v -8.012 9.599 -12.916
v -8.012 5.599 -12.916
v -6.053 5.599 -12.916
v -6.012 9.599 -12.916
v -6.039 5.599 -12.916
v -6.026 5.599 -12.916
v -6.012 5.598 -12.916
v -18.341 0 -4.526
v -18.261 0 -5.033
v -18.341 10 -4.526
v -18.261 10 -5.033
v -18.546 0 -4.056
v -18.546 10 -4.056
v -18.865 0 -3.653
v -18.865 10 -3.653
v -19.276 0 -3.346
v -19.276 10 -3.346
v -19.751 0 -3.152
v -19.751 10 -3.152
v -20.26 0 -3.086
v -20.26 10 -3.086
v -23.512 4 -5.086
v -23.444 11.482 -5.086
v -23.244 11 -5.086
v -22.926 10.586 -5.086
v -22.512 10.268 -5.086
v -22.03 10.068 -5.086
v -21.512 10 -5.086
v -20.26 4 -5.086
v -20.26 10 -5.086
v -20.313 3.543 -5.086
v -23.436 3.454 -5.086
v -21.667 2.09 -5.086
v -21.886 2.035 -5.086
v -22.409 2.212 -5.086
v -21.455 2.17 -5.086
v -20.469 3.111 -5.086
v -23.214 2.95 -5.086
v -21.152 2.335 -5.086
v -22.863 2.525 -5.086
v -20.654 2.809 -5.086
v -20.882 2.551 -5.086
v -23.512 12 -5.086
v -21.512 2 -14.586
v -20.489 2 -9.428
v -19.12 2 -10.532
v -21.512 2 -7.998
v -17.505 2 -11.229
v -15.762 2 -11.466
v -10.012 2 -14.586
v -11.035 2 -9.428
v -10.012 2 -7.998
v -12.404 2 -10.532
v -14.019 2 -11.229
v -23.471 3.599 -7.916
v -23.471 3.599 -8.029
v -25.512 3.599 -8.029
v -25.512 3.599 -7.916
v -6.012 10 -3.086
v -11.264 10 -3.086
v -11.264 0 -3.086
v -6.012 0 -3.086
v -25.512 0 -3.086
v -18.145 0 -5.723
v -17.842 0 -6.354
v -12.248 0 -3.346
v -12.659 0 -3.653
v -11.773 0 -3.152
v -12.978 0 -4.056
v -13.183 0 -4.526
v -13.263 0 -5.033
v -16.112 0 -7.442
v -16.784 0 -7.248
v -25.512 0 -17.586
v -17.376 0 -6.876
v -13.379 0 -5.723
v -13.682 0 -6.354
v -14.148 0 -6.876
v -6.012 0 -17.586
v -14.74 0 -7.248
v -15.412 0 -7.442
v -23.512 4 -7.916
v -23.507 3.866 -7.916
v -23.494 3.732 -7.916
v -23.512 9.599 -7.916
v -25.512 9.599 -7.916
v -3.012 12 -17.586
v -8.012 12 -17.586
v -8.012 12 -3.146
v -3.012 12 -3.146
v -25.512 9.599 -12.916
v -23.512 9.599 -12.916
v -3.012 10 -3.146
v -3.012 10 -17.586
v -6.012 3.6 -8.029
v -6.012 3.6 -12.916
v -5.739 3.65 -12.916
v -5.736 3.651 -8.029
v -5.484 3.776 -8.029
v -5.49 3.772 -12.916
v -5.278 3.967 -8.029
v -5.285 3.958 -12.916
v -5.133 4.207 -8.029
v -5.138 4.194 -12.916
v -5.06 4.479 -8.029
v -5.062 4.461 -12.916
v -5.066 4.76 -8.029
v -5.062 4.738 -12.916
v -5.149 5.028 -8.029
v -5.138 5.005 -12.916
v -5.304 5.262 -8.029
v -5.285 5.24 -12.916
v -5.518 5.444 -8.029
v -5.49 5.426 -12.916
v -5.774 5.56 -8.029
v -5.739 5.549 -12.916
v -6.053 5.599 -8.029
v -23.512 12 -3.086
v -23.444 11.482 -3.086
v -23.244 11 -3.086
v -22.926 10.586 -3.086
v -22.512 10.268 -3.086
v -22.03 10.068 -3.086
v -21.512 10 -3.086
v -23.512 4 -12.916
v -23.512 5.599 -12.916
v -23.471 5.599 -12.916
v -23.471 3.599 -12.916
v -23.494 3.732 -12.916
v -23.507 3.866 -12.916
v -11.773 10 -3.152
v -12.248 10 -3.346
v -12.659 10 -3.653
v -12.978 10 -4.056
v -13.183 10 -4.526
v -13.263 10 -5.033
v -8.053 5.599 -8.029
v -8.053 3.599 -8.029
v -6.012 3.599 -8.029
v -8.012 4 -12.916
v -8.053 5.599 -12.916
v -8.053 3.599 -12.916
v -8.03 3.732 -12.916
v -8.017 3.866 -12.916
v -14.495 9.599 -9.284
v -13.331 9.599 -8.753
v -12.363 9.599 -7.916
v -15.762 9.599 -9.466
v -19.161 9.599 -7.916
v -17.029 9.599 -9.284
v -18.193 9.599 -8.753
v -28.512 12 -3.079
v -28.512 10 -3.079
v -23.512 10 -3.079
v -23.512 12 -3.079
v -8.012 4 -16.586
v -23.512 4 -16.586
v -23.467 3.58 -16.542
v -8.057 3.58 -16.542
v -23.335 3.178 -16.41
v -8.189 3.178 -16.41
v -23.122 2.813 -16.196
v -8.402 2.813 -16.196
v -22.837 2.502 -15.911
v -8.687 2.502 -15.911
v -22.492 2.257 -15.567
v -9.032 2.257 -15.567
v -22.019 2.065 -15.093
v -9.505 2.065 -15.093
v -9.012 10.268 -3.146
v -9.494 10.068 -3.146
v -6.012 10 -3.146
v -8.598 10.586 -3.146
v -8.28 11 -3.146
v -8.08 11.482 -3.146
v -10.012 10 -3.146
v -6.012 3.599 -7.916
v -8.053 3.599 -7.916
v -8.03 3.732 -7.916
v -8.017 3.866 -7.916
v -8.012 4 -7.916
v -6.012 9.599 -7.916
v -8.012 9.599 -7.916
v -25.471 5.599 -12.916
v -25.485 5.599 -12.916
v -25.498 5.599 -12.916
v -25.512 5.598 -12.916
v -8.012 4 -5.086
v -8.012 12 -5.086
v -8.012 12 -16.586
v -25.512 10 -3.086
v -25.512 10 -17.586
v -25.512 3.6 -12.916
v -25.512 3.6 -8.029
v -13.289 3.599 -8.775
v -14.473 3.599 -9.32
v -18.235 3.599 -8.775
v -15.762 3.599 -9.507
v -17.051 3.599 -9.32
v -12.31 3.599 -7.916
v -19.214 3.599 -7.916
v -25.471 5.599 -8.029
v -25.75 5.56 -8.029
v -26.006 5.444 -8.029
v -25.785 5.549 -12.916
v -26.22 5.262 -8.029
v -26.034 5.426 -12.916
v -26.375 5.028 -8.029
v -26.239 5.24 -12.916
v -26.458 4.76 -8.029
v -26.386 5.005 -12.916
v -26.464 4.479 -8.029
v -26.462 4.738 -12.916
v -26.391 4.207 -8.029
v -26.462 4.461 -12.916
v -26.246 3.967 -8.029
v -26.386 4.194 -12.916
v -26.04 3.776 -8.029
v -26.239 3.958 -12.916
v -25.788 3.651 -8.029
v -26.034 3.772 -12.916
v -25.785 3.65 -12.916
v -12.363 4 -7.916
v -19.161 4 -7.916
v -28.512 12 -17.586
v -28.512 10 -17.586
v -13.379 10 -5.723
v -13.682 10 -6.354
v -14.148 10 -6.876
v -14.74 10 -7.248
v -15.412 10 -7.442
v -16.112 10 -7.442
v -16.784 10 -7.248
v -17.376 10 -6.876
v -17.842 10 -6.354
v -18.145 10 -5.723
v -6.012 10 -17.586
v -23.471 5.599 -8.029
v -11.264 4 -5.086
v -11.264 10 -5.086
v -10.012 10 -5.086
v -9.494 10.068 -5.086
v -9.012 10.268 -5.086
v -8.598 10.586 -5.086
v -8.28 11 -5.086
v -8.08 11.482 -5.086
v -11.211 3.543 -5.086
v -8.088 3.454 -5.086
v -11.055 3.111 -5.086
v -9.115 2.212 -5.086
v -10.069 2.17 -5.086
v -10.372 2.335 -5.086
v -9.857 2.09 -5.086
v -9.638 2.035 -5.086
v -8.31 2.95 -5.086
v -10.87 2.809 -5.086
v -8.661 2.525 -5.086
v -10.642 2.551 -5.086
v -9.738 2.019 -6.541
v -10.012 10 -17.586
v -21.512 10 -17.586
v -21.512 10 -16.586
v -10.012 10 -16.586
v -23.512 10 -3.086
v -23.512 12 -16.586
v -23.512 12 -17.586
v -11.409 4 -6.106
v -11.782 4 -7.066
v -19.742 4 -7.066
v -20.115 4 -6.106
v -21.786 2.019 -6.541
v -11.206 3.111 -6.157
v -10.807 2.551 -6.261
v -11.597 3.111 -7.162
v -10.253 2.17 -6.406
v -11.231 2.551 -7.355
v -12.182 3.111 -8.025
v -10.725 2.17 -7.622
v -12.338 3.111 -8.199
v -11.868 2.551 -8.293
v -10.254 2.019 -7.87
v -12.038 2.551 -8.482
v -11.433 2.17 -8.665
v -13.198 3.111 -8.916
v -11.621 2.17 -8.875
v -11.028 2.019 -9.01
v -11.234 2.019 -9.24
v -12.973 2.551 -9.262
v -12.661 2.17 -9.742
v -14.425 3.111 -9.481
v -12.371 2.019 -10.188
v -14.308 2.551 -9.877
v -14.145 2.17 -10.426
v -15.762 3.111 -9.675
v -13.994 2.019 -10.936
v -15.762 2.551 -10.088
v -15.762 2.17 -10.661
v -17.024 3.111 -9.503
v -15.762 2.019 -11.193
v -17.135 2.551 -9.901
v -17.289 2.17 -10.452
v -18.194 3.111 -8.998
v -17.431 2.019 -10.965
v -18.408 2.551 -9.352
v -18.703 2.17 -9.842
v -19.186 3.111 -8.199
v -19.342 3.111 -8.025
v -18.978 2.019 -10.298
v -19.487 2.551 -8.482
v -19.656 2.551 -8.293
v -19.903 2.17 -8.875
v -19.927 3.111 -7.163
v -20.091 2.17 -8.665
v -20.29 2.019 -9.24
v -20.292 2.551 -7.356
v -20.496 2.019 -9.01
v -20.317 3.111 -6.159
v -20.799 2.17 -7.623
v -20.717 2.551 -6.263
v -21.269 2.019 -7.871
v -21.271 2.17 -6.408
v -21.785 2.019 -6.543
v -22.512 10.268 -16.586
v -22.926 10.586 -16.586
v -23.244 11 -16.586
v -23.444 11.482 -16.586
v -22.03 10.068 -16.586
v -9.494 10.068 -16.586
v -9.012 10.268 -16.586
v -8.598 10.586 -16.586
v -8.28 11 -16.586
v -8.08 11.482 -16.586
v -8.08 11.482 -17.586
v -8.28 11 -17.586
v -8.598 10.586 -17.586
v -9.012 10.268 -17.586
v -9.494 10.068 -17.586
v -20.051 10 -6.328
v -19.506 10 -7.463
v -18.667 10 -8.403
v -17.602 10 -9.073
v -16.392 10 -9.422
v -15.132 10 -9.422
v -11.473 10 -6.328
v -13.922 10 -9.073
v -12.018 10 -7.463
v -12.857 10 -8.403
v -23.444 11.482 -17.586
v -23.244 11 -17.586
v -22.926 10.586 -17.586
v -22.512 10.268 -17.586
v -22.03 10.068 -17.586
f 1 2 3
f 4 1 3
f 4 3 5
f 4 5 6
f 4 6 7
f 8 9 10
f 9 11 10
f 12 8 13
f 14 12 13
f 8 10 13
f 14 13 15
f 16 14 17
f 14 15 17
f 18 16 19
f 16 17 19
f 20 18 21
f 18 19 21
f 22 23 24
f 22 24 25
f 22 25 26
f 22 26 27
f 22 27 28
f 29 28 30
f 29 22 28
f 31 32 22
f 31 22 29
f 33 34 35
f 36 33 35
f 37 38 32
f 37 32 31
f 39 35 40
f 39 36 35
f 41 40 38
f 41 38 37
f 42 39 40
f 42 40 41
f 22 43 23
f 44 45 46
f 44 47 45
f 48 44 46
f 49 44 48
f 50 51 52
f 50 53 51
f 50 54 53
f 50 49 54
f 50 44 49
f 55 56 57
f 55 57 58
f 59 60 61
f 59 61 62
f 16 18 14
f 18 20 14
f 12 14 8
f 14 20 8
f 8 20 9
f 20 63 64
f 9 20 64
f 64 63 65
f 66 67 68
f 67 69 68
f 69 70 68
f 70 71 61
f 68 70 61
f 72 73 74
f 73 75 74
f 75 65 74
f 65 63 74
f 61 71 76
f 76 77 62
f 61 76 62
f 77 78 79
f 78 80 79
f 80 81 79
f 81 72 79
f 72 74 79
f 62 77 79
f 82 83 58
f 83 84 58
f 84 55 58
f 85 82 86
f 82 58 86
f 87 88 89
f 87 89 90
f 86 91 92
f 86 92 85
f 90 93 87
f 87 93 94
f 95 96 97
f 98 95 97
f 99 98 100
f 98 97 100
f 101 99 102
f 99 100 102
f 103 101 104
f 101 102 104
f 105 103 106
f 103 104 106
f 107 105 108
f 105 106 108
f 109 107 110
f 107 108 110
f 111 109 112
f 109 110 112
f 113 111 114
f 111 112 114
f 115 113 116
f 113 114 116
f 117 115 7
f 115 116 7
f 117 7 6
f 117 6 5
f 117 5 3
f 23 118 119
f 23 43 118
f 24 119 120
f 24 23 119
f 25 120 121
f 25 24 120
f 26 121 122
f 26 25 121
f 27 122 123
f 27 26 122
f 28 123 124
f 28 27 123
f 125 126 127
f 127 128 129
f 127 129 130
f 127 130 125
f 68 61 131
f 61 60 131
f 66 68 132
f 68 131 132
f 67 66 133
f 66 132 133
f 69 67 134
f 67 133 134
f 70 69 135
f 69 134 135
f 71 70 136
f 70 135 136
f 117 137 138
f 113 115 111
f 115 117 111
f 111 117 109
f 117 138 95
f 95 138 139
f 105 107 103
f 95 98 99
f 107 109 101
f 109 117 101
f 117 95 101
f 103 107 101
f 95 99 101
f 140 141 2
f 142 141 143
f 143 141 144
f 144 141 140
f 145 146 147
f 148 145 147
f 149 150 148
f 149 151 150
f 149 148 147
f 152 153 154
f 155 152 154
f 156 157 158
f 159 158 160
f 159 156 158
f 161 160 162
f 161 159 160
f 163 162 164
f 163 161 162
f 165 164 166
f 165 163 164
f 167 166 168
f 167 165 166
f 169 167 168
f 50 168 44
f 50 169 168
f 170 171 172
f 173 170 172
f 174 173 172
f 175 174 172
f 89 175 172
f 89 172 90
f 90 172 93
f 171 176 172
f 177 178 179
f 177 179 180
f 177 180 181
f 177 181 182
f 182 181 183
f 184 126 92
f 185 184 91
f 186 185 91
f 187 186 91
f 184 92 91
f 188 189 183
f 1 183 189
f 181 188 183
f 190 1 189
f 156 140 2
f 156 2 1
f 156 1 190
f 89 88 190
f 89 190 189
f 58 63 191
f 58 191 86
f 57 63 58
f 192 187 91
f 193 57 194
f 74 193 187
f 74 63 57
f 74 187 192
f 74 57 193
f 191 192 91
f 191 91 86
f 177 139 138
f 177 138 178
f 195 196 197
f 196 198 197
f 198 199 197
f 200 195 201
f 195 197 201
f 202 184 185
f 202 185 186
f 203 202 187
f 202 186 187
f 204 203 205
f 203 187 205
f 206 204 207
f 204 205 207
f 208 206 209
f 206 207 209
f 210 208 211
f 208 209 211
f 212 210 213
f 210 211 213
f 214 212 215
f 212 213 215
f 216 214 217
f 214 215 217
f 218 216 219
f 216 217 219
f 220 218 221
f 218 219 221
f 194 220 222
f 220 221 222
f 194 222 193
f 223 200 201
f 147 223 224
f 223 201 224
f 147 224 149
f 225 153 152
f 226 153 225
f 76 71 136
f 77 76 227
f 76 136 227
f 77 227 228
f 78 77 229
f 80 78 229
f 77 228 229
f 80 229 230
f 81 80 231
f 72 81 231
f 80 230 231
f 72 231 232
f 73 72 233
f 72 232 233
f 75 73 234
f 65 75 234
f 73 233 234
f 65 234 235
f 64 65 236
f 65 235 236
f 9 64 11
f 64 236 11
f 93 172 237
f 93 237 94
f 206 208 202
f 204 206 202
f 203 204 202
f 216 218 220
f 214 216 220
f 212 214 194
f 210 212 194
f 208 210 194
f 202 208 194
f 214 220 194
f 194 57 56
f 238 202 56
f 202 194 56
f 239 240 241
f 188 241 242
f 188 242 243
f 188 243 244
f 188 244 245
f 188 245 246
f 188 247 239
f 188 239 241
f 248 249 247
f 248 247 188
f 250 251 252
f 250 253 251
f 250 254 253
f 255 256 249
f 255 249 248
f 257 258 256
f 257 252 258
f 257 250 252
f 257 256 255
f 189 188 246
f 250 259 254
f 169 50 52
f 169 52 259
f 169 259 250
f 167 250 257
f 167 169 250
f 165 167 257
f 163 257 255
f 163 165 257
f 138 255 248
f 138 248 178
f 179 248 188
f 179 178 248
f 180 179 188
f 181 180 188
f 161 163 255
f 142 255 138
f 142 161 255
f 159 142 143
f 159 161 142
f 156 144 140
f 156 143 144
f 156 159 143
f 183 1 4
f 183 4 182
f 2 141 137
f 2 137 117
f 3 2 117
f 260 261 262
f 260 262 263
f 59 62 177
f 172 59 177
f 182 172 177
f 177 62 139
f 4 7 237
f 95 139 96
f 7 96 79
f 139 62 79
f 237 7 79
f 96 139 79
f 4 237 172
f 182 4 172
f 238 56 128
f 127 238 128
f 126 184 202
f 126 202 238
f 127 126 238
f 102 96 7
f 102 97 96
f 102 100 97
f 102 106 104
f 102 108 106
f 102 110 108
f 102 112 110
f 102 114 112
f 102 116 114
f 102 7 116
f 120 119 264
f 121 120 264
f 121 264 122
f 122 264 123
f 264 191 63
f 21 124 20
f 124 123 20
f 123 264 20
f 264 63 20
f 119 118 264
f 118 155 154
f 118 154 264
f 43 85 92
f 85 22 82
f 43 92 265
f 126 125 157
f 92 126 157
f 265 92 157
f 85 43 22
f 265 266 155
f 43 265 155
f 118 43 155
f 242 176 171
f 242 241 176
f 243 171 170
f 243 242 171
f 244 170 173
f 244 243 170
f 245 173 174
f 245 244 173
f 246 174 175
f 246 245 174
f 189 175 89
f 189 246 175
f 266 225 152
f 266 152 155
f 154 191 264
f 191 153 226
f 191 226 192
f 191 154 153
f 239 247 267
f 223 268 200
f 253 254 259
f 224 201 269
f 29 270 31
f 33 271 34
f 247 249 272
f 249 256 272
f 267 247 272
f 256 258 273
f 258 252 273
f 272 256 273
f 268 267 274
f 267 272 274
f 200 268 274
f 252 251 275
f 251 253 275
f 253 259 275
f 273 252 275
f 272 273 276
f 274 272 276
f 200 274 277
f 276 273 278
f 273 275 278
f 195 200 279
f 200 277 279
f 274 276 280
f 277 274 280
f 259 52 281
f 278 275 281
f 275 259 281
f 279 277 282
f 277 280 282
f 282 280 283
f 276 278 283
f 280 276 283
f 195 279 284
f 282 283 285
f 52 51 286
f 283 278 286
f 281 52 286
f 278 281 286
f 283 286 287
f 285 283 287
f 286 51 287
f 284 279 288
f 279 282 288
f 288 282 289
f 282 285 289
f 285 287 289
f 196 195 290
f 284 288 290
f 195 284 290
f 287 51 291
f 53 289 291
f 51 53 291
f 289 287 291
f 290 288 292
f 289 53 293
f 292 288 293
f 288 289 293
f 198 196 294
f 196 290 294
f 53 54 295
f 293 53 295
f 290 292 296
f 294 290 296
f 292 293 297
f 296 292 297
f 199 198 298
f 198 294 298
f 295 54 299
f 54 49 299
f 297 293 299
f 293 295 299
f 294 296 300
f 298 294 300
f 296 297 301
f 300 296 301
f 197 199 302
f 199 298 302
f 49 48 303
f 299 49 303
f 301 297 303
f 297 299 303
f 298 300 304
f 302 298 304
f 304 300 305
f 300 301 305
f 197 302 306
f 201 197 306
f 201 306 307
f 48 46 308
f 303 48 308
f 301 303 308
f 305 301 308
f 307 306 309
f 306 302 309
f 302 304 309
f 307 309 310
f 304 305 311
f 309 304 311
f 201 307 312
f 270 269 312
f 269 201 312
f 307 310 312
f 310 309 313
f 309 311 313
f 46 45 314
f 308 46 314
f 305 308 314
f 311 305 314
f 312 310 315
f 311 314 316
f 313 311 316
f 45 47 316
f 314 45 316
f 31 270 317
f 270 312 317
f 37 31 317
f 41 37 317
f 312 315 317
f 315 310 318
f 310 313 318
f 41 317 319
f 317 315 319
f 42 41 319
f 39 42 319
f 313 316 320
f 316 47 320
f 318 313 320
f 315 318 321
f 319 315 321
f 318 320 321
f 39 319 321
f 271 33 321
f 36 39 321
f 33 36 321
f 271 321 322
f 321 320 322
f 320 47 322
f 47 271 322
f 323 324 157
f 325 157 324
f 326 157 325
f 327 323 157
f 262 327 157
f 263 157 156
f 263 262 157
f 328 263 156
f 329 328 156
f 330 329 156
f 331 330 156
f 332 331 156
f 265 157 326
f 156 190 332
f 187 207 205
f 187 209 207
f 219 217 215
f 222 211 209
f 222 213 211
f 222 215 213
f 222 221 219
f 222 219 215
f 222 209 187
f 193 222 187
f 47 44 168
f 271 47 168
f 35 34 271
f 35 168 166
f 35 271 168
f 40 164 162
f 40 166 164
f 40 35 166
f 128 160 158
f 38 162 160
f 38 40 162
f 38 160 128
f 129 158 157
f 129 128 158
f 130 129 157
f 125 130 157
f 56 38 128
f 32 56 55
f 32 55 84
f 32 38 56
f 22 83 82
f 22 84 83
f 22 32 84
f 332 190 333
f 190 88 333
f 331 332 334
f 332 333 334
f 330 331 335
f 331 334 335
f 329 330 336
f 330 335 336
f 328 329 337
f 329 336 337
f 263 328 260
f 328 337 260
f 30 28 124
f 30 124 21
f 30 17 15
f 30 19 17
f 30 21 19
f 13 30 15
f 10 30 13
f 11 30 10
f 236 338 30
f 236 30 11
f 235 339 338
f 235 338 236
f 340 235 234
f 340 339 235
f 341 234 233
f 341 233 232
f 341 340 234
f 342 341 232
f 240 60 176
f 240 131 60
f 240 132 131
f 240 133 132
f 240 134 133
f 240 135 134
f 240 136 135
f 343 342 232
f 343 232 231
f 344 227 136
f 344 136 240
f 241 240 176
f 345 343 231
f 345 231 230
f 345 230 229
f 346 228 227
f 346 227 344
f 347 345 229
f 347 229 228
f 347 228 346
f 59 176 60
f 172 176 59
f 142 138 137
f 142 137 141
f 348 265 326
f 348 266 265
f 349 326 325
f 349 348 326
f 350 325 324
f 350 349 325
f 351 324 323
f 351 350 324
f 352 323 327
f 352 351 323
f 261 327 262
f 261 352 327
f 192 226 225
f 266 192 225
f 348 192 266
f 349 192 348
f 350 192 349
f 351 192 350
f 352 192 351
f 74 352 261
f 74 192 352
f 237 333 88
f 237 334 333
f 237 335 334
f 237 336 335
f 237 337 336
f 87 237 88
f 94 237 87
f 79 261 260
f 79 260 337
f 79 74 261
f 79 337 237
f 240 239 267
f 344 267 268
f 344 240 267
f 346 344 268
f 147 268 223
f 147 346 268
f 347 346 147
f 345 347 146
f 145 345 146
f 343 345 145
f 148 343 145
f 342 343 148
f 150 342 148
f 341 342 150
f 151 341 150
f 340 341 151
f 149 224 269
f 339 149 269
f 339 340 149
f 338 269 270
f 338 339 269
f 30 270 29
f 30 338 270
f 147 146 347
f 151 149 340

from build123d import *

# Parameters (mm, degrees)
SKETCH1_W           = 19.5
SKETCH1_H           = 14.5
BOSS_EXTRUDE1_DEPTH = 10
SKETCH2_R           = 2.5
CUT_EXTRUDE1_DEPTH  = 10
SHELL1_T            = -2
FILLET1_R           = 2
SKETCH3_W           = 15.5
SKETCH3_H           = 1
CUT_EXTRUDE3_DEPTH  = 8
FILLET2_R           = 2
SKETCH4_W           = 5
SKETCH4_H           = 14.507593663
SKETCH4_H_2         = 14.440076449
BOSS_EXTRUDE2_DEPTH = 2
FILLET3_R           = 2
FILLET4_R           = 2
SKETCH5_W           = 5
SKETCH5_H           = 6
CUT_EXTRUDE4_DEPTH  = 22
SKETCH6_W           = 3
SKETCH6_H           = 4.886451311
BOSS_EXTRUDE3_DEPTH = 2
FILLET5_R           = 1


# Some blends are built 0.0001 mm under size
with BuildPart() as part:
    # Sketch1 → Boss-Extrude1 (new body)
    with BuildSketch(Plane(origin=(0, 0, 0), x_dir=(1, 0, 0), z_dir=(0, 1, 0))):
        with Locations((-15.762004242, 10.336365648)):
            Rectangle(SKETCH1_W, SKETCH1_H)
    extrude(amount=BOSS_EXTRUDE1_DEPTH)

    # Sketch2 → Cut-Extrude1 (cut)
    with BuildSketch(Plane(origin=(0, 10, 0), x_dir=(1, 0, 0), z_dir=(0, 1, 0))):
        with Locations((-15.762004242, 4.966482791)):
            Circle(SKETCH2_R)
    extrude(amount=-CUT_EXTRUDE1_DEPTH, mode=Mode.SUBTRACT)

    # Shell1
    shell1_openings = [part.faces().sort_by_distance(p)[0] for p in [
        (-15.762004242, 10, -10.695281365),
    ]]
    offset(amount=SHELL1_T, openings=shell1_openings, kind=Kind.INTERSECTION)

    # Fillet1
    fillet1_edges = [part.edges().sort_by_distance(p)[0] for p in [
        (-17.409778355, 5, -3.086365648),
        (-14.114230128, 5, -3.086365648),
    ]]
    fillet(fillet1_edges, radius=FILLET1_R)

    # Sketch3 → Cut-Extrude3 (cut)
    with BuildSketch(Plane(origin=(0, 10, 0), x_dir=(1, 0, 0), z_dir=(0, 1, 0))):
        with Locations((-15.762004242, 16.086365648)):
            Rectangle(SKETCH3_W, SKETCH3_H)
    extrude(amount=-CUT_EXTRUDE3_DEPTH, mode=Mode.SUBTRACT)

    # Fillet2
    # the kernel refuses this fillet: 2 mm, written as the material it adds along each edge
    with BuildSketch(Plane(origin=(-15.762004242, 2, -4.966482791), x_dir=(0.4658564831234789, 0, 0.8848602924370738), z_dir=(-0.8848602924370738, 0, 0.4658564831234789))) as fillet2_piece_1_section:
        with BuildLine():
            CenterArc((4.5 + FILLET2_R, FILLET2_R), FILLET2_R, 180, 90)
            Line((4.5, FILLET2_R), (4.5, 0))
            Line((4.5, 0), (4.5 + FILLET2_R, 0))
        make_face()
    fillet2_piece_1 = revolve(axis=Axis((-15.762004242, 2, -4.966482791), (0, 1, 0)), revolution_arc=304.468667484, mode=Mode.PRIVATE)
    fillet2_piece_1 = split(fillet2_piece_1, bisect_by=Plane(origin=(-15.762004242, 2.56810824, -5.086365648), z_dir=(0, 0, -1)), keep=Keep.TOP, mode=Mode.PRIVATE)
    add(fillet2_piece_1)
    with BuildSketch(Plane(origin=(-8.012004242, 2, -16.586365648), x_dir=(-1, 0, 0), z_dir=(0, 0, 1)), Plane(origin=(-23.512004242, 2, -5.086365648), x_dir=(1, 0, 0), z_dir=(0, 0, -1))) as fillet2_piece_2:
        with BuildLine():
            CenterArc((FILLET2_R, -FILLET2_R), FILLET2_R, 90, 90)
            Line((0, -FILLET2_R), (0, 0))
            Line((0, 0), (FILLET2_R, 0))
        make_face()
    extrude(amount=11.5)
    with BuildSketch(Plane(origin=(-8.012004242, 2, -16.586365648), x_dir=(0, 1, 0), z_dir=(-1, 0, 0))) as fillet2_piece_3:
        with BuildLine():
            CenterArc((FILLET2_R, -FILLET2_R), FILLET2_R, 90, 90)
            Line((0, -FILLET2_R), (0, 0))
            Line((0, 0), (FILLET2_R, 0))
        make_face()
    extrude(amount=15.5)

    # Sketch4 → Boss-Extrude2 (add)
    with BuildSketch(Plane(origin=(0, 10, 0), x_dir=(1, 0, 0), z_dir=(0, 1, 0))):
        with Locations((-26.012004242, 10.332568817)):
            Rectangle(SKETCH4_W, SKETCH4_H)
        with Locations((-5.512004242, 10.366327424)):
            Rectangle(SKETCH4_W, SKETCH4_H_2)
    extrude(amount=BOSS_EXTRUDE2_DEPTH)

    # Fillet3
    fillet3_edges = [part.edges().sort_by_distance(p)[0] for p in [
        (-8.012004242, 10, -4.116327424),
        (-23.512004242, 10, -4.086365648),
    ]]
    fillet(fillet3_edges, radius=FILLET3_R - 0.0001)  # a hair under: the kernel refuses the full size

    # Fillet4
    fillet4_edges = [part.edges().sort_by_distance(p)[0] for p in [
        (-23.512004242, 10, -17.086365648),
        (-8.012004242, 10, -17.086365648),
    ]]
    fillet(fillet4_edges, radius=FILLET4_R - 0.0001)  # a hair under: the kernel refuses the full size

    # Sketch5 → Cut-Extrude4 (cut)
    with BuildSketch(Plane.ZY.offset(25.512004242)):
        with Locations((-10.415649008, 6.599188408)):
            Rectangle(SKETCH5_W, SKETCH5_H)
    extrude(amount=-CUT_EXTRUDE4_DEPTH, mode=Mode.SUBTRACT)

    # Sketch6 → Boss-Extrude3 (add)
    with BuildSketch(Plane(origin=(0, 3.599188408, 0), x_dir=(1, 0, 0), z_dir=(0, 1, 0))):
        with Locations((-24.971430195, 10.472423353)):
            Rectangle(SKETCH6_W, SKETCH6_H)
        with Locations((-6.552578288, 10.472423353)):
            Rectangle(SKETCH6_W, SKETCH6_H)
    extrude(amount=BOSS_EXTRUDE3_DEPTH)

    # Fillet5
    # the kernel refuses this fillet: 1 mm, written as the material it takes off along each edge
    with BuildSketch(Plane(origin=(-5.052578288, 3.599188408, -15.415649008), x_dir=(0, 1, 0), z_dir=(0, 0, 1))) as fillet5_piece_1_section:
        with BuildLine():
            CenterArc((FILLET5_R, FILLET5_R), FILLET5_R, 180, 90)
            Line((0, FILLET5_R), (0, 0))
            Line((0, 0), (FILLET5_R, 0))
        make_face()
    fillet5_piece_1 = extrude(amount=9.886451311, mode=Mode.PRIVATE)
    fillet5_piece_1 = split(fillet5_piece_1, bisect_by=Plane(origin=(-6.012004242, 3.822567924, -10.472423353), z_dir=(1, 0, 0)), keep=Keep.TOP, mode=Mode.PRIVATE)
    add(fillet5_piece_1, mode=Mode.SUBTRACT)
    with BuildSketch(Plane(origin=(-5.052578288, 5.599188408, -12.915649008), x_dir=(-1, 0, 0), z_dir=(0, 0, 1))) as fillet5_piece_2:
        with BuildLine():
            CenterArc((FILLET5_R, FILLET5_R), FILLET5_R, 180, 90)
            Line((0, FILLET5_R), (0, 0))
            Line((0, 0), (FILLET5_R, 0))
        make_face()
    extrude(amount=4.886451311, mode=Mode.SUBTRACT)
    with BuildSketch(Plane(origin=(-26.471430195, 3.599188408, -15.415649008), x_dir=(1, 0, 0), z_dir=(0, 0, 1))) as fillet5_piece_3_section:
        with BuildLine():
            CenterArc((FILLET5_R, FILLET5_R), FILLET5_R, 180, 90)
            Line((0, FILLET5_R), (0, 0))
            Line((0, 0), (FILLET5_R, 0))
        make_face()
    fillet5_piece_3 = extrude(amount=9.886451311, mode=Mode.PRIVATE)
    fillet5_piece_3 = split(fillet5_piece_3, bisect_by=Plane(origin=(-25.512004242, 3.822567924, -10.472423353), z_dir=(-1, 0, 0)), keep=Keep.TOP, mode=Mode.PRIVATE)
    add(fillet5_piece_3, mode=Mode.SUBTRACT)
    with BuildSketch(Plane(origin=(-26.471430195, 5.599188408, -12.915649008), x_dir=(1, 0, 0), z_dir=(0, 0, 1))) as fillet5_piece_4:
        with BuildLine():
            CenterArc((FILLET5_R, -FILLET5_R), FILLET5_R, 90, 90)
            Line((0, -FILLET5_R), (0, 0))
            Line((0, 0), (FILLET5_R, 0))
        make_face()
    extrude(amount=4.886451311, mode=Mode.SUBTRACT)


solid = part.part
